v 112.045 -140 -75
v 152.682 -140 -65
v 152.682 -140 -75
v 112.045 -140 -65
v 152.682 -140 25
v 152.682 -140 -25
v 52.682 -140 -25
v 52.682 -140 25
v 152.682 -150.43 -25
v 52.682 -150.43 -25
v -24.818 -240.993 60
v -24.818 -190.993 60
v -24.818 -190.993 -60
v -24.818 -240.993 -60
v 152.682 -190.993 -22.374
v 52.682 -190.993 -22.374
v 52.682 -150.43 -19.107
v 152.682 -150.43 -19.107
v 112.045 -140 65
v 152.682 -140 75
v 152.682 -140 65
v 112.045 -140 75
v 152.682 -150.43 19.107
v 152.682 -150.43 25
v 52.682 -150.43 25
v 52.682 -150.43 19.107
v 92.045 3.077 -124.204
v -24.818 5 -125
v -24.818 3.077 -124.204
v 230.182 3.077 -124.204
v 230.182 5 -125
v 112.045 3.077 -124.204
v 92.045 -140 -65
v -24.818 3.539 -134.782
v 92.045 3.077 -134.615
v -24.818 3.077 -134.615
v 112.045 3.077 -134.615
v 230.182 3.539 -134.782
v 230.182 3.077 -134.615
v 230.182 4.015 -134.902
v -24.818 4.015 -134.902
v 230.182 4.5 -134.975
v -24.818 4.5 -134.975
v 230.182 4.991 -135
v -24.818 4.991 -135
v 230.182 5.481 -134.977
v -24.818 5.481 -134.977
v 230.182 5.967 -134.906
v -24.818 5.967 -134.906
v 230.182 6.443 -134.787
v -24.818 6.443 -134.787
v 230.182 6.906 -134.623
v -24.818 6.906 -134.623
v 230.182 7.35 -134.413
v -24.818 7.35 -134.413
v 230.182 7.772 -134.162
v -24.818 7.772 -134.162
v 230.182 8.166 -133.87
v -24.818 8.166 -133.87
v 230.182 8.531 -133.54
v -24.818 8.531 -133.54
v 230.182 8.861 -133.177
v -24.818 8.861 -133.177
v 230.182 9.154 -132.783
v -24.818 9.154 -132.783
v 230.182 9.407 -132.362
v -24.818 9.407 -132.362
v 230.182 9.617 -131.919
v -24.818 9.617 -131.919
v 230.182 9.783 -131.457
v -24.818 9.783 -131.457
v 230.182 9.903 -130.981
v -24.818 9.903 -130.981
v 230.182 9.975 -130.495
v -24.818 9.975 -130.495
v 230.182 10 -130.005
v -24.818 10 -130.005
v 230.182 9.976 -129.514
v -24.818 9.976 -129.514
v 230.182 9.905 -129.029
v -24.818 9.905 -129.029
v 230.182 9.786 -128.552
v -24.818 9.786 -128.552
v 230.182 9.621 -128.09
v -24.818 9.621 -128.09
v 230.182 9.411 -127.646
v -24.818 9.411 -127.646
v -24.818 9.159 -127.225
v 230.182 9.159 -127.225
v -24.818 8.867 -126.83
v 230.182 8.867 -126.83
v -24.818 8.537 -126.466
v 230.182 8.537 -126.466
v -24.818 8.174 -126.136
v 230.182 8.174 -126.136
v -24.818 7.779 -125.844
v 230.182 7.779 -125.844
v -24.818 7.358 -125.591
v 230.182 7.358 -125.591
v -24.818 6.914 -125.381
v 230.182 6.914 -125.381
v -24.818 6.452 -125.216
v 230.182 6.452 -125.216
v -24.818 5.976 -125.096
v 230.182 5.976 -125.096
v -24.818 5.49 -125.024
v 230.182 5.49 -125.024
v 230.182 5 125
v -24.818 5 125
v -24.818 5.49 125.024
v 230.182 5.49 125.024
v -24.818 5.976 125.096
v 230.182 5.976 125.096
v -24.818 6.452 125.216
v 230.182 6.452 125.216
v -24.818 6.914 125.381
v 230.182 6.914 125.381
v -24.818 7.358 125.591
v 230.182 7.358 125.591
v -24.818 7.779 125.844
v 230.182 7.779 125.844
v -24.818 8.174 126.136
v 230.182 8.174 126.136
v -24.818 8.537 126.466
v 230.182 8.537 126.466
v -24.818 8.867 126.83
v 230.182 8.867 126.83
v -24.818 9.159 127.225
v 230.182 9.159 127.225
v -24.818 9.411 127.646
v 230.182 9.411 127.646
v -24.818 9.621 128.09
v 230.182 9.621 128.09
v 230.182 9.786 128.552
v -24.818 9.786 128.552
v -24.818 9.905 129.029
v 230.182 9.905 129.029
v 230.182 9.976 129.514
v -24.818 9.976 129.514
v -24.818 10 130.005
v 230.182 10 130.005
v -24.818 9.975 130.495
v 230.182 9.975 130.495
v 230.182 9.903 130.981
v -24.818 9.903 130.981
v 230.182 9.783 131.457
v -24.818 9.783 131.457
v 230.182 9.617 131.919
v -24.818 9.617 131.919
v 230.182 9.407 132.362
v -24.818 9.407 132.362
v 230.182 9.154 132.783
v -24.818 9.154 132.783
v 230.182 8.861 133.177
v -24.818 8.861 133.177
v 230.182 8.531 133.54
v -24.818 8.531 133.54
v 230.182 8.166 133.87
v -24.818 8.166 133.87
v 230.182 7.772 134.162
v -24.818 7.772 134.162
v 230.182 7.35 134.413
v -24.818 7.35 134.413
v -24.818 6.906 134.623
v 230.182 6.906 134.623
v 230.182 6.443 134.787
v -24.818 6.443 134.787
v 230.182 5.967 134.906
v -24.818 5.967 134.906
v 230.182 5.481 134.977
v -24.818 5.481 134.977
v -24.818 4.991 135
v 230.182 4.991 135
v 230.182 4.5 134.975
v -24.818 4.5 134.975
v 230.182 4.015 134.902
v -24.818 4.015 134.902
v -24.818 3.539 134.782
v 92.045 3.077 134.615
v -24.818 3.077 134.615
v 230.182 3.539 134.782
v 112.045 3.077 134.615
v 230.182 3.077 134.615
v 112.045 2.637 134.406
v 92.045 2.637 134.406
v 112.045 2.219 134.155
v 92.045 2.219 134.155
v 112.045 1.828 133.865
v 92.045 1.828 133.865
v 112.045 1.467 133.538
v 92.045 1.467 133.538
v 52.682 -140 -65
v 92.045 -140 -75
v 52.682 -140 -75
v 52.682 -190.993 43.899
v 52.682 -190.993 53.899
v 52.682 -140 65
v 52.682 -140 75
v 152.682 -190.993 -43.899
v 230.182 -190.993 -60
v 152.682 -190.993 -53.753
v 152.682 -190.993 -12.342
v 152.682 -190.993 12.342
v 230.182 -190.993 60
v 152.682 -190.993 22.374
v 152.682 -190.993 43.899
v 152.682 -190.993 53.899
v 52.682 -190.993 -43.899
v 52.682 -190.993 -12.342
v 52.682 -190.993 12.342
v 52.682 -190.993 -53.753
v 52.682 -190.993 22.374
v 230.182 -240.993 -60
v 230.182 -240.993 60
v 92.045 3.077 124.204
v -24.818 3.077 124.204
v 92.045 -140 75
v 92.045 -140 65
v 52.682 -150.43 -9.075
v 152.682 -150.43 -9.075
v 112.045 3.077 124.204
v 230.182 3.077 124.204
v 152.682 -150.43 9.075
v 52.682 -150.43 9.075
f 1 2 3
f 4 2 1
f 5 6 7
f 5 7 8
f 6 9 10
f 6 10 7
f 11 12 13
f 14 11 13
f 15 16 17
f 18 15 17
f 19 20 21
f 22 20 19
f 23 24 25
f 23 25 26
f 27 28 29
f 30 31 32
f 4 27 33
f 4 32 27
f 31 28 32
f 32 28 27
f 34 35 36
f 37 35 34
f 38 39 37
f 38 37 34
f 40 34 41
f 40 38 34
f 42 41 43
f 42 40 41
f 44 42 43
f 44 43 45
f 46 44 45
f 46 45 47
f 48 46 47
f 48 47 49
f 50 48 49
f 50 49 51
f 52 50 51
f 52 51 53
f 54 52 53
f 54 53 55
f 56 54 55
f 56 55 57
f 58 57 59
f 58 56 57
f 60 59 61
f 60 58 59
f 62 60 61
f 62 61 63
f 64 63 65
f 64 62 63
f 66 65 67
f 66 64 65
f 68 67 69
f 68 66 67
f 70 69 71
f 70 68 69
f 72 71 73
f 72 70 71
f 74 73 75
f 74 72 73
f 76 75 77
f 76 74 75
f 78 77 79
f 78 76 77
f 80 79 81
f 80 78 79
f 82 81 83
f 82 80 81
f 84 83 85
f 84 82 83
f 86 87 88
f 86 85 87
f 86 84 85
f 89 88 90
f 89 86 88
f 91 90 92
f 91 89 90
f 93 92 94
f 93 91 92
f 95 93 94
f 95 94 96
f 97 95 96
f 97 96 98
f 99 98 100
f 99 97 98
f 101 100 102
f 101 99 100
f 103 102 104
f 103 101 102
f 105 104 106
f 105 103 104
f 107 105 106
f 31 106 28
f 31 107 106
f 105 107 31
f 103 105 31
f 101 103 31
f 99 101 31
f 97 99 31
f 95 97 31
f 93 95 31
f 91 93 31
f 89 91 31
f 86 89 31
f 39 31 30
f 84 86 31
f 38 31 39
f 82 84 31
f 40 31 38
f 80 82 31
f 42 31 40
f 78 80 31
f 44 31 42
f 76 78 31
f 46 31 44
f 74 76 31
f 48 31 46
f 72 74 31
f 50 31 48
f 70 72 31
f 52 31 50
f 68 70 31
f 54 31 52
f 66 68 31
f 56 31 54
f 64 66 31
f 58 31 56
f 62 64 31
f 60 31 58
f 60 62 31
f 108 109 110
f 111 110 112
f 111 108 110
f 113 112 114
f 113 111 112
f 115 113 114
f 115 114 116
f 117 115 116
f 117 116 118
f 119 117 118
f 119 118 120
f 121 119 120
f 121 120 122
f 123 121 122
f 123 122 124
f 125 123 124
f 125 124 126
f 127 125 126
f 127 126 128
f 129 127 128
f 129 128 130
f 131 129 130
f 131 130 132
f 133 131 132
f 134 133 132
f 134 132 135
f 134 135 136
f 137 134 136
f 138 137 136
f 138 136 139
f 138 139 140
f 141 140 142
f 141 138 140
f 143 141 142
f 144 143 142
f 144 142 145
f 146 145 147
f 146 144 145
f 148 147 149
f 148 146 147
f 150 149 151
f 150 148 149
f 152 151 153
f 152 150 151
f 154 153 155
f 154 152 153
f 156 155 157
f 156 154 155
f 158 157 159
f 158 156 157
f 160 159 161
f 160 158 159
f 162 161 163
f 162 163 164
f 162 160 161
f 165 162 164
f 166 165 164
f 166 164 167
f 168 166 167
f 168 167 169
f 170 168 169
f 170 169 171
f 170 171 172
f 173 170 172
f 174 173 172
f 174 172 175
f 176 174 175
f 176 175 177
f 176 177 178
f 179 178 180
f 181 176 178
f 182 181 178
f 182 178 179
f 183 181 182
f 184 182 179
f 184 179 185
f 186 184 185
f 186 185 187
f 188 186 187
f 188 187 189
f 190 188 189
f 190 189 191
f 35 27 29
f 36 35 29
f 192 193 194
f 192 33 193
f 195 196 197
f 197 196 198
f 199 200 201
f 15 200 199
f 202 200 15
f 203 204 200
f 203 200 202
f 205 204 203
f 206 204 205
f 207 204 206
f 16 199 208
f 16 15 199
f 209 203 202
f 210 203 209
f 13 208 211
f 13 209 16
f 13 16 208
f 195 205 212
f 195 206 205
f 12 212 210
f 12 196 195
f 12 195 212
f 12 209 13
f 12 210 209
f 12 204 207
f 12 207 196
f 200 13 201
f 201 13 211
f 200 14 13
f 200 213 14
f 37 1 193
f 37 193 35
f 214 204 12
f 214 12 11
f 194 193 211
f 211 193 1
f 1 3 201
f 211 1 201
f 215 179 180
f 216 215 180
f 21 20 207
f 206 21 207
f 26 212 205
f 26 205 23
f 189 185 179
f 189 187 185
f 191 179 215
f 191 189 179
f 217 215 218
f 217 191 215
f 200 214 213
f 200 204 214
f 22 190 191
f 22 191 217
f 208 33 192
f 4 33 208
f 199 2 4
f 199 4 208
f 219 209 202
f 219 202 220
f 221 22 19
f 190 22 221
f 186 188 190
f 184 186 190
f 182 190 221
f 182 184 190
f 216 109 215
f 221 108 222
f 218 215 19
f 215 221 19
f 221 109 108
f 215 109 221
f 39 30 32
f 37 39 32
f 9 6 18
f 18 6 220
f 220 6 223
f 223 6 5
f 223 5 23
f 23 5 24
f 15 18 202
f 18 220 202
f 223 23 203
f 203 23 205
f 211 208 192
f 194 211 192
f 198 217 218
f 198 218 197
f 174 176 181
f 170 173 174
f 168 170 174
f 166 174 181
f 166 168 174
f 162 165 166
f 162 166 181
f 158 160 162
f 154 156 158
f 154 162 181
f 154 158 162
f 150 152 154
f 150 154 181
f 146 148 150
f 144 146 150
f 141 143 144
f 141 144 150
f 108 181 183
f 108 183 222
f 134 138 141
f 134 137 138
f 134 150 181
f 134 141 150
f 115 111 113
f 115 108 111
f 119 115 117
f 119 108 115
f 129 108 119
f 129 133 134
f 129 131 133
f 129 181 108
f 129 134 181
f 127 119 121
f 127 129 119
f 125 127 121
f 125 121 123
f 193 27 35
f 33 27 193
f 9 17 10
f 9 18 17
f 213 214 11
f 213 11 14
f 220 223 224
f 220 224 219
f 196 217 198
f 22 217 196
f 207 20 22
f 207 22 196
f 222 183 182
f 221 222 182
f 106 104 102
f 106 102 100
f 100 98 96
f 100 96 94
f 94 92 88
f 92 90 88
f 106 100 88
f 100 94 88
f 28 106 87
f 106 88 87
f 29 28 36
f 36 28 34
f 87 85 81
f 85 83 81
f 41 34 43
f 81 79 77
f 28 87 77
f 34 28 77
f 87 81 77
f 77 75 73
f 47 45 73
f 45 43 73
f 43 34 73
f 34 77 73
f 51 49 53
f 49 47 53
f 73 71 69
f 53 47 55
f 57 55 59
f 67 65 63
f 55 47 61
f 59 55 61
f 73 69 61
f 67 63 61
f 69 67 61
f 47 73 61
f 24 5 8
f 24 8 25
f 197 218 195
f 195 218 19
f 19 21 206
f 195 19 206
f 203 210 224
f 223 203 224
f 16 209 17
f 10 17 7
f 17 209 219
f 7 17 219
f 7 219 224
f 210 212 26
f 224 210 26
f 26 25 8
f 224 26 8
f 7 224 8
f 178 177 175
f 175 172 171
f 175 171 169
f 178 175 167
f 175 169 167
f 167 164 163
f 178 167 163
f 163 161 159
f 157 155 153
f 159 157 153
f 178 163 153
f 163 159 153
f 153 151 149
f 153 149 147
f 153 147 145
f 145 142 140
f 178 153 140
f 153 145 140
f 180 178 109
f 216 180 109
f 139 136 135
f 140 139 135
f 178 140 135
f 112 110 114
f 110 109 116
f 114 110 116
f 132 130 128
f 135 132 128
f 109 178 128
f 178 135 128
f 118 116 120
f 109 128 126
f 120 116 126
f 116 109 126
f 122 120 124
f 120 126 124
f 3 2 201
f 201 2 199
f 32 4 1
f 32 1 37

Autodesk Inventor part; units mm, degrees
ref_plane "YZ Plane" through (0, 0, 0) normal (1, 0, 0) x (0, 1, 0)
ref_plane "XZ Plane" through (0, 0, 0) normal (0, 1, 0) x (-1, 0, 0)
ref_plane "XY Plane" through (0, 0, 0) normal (0, 0, 1) x (1, 0, 0)
sketch "Sketch4" plane through (0, 0, 0) normal (0, 1, 0) x (-1, 0, 0)
  line L0 (-102.6818, 131.0909) -> (-102.6818, 58.0909) construction
  line L1 (24.8182, 125) -> (-230.1818, 125)
  line L2 (-230.1818, 125) -> (-230.1818, 135)
  line L3 (-230.1818, 135) -> (24.8182, 135)
  line L4 (24.8182, 135) -> (24.8182, 125)
  line L5 (24.8182, 125) -> (-230.1818, 135) construction
  line L6 (-230.1818, 125) -> (24.8182, 135) construction
  line L7 (0, 0) -> (36.133, 0) construction
  line L8 (24.8182, -125) -> (-230.1818, -125)
  line L9 (-230.1818, -125) -> (-230.1818, -135)
  line L10 (-230.1818, -135) -> (24.8182, -135)
  line L11 (24.8182, -135) -> (24.8182, -125)
  line L12 (24.8182, -125) -> (-230.1818, -135) construction
  line L13 (-230.1818, -125) -> (24.8182, -135) construction
  point P0 (-102.6818, 130)
  dimension "d4" = 10
  dimension "d6" = 250
  dimension "d7" = 255
extrude "Extrusion2" add sketch "Sketch4" along normal blind 10
sketch "Sketch9" plane through (230.1818, 0, -125) normal (1, 0, 0) x (0, 0, -1)
  line L0 (-125, 0) -> (-125, -106.9842) construction
  line L1 (10, 0) -> (10, 10) construction
  line L2 (0, 10) -> (10, 10) construction
  line L3 (10, 0) -> (0, 10) construction
  line L4 (0, 10) -> (10, 10) construction
  line L5 (10, 10) -> (0, 0) construction
  circle A0 centre (5, 5) radius 5
  line L6 (-260, 0) -> (-260, 10) construction
  line L7 (-250, 10) -> (-260, 10) construction
  line L8 (-260, 0) -> (-250, 10) construction
  line L9 (-250, 10) -> (-260, 10) construction
  line L10 (-260, 10) -> (-250, 0) construction
  circle A1 centre (-255, 5) radius 5
extrude "Extrusion3" cut sketch "Sketch9" against normal through all keep common part
sketch "Sketch10" plane through (230.1818, 5, -130) normal (1, 0, 0) x (0, 0, -1)
  circle A0 centre (0, 0) radius 5 construction
  line L0 (0, 5) -> (-260, 5)
  line L1 (-130, -5) -> (-130, 5) construction
  line L2 (-155, -155.4301) -> (-105, -155.4301)
  line L3 (-105, -155.4301) -> (-105, -145)
  line L4 (-105, -145) -> (-155, -145)
  line L5 (-155, -145) -> (-155, -155.4301)
  line L6 (-155, -155.4301) -> (-105, -145) construction
  line L7 (-105, -155.4301) -> (-155, -145) construction
  line L8 (-130, -150.215) -> (-130, -124.8826) construction
  dimension "d13" = 150
  dimension "d34" = 50
extrude "Extrusion4" add sketch "Sketch10" against normal blind 255
sketch "Sketch11" plane through (230.1818, 5, -130) normal (1, 0, 0) x (0, 0, -1)
  circle A0 centre (0, 0) radius 5 projected
  line L0 (-155, -145) -> (-105, -145) projected
  line L1 (-130, 0) -> (-130, -145) construction
  line L2 (-130, -145) -> (-286.0792, -145) construction
  line L3 (-130, -145) -> (0, -145) construction
  circle A1 centre (-60, -145) radius 5
  circle A2 centre (-200, -145) radius 5
  line L4 (-55, -145) -> (4.6154, -1.9231)
  circle A3 centre (-260, 0) radius 5 projected
  line L5 (-190, -245.9934) -> (-70, -245.9934)
  line L6 (-70, -245.9934) -> (-70, -195.9934)
  line L7 (-70, -195.9934) -> (-190, -195.9934)
  line L8 (-190, -195.9934) -> (-190, -245.9934)
  line L9 (-190, -245.9934) -> (-70, -195.9934) construction
  line L10 (-70, -245.9934) -> (-190, -195.9934) construction
  line L11 (-130, -220.9934) -> (-130, -179.9046) construction
  line L12 (-55, -145) -> (-76.2472, -195.9934)
  line L13 (-5, 0) -> (-65, -145)
  line L14 (-65, -145) -> (-86.1007, -195.9934)
  line L15 (-255, 0) -> (-195, -145)
  line L16 (-263.5381, -3.533) -> (-205, -145)
  line L17 (-195, -145) -> (-173.8993, -195.9934)
  line L18 (-205, -145) -> (-183.8993, -195.9934)
  point P0 (-130, -5)
  dimension "d18" = 10
  dimension "d20" = 140
  dimension "d21" = 120
  dimension "d22" = 50
extrude "Extrusion5" add sketch "Sketch11" against normal blind 255 contours A0 L4 A1 L13 | A1 L12 L13 | A1 L12 L7 L14 | L7 L6 L5 L8 | L7 L18 A2 L17 | A2 L18 L15 | A2 L16 A3 L15
sketch "Sketch12" plane through (-24.8182, 5, -130) normal (-1, 0, 0) x (0, 0, 1)
  line L0 (173.8993, -195.9934) -> (86.1007, -195.9934) projected
  line L1 (105, -155.4301) -> (155, -155.4301) projected
  line L2 (86.1007, -195.9934) -> (173.8993, -195.9934) projected
  line L3 (152.374, -195.9934) -> (149.1071, -155.4301)
  line L4 (142.3416, -195.9934) -> (139.0748, -155.4301)
  line L5 (155, -155.4301) -> (105, -155.4301) projected
  line L6 (255, 0) -> (173.8993, -195.9934) projected
  line L7 (86.1007, -195.9934) -> (5, 0) projected
  line L8 (173.8993, -195.9934) -> (105, -155.4301) construction
  line L9 (155, -155.4301) -> (86.1007, -195.9934) construction
  line L10 (130, -170.1484) -> (130, -155.4301) construction
  line L11 (107.626, -195.9934) -> (110.8929, -155.4301)
  line L12 (117.6584, -195.9934) -> (120.9252, -155.4301)
  point P0 (130, -5)
  point P1 (107.626, -195.9934)
  point P2 (117.6584, -195.9934)
  dimension "d25" = 10
extrude "Extrusion6" add sketch "Sketch12" against normal blind 255 contours L0 L4 L1 L3 | L0 L11 L1 L12
sketch "Sketch13" plane through (230.1818, -240.9934, -60) normal (0, 0, -1) x (-1, 0, 0)
  line L0 (0, 50) -> (255, 50) projected
  line L1 (0, 50) -> (0, 244.0703) projected
  line L2 (0, 50) -> (255, 50) projected
  line L3 (255, 244.0703) -> (255, 50) projected
  line L4 (0, 244.0703) -> (255, 244.0703) projected
  line L5 (0, 90.5633) -> (255, 90.5633) projected
  line L6 (0, 100.9934) -> (255, 100.9934) projected
  line L7 (0, 0) -> (255, 0) projected
  line L8 (0, 0) -> (0, 50) projected
  line L9 (255, 50) -> (255, 0) projected
  line L10 (255, 100.9934) -> (0, 244.0703) construction
  line L11 (1.2728, 100.9934) -> (255, 244.0703) construction
  line L12 (138.1364, 100.9934) -> (118.1364, 100.9934)
  line L13 (118.1364, 100.9934) -> (118.1364, 244.0703)
  line L14 (118.1364, 244.0703) -> (138.1364, 244.0703)
  line L15 (138.1364, 244.0703) -> (138.1364, 100.9934)
  line L16 (138.1364, 100.9934) -> (118.1364, 244.0703) construction
  line L17 (118.1364, 100.9934) -> (138.1364, 244.0703) construction
  point P0 (230.1818, 240.9934)
  point P1 (128.1364, 172.5318)
  point P2 (138.1364, 100.9934)
  point P3 (118.1364, 100.9934)
  dimension "d28" = 20
extrude "Extrusion7" cut sketch "Sketch13" along normal mid plane 434.75 contours L1 L4 L13 L6 | L6 L15 L4 L3
sketch "Sketch14" plane through (230.1818, -240.9934, -60) normal (0, 0, -1) x (-1, 0, 0)
  line L0 (0, 50) -> (255, 50) projected
  line L1 (255, 100.9934) -> (255, 50) projected
  line L2 (255, 50) -> (255, 0) projected
  line L3 (255, 100.9934) -> (138.1364, 100.9934) projected
  line L4 (0, 0) -> (255, 0) projected
  line L5 (0, 0) -> (0, 50) projected
  line L6 (0, 90.5633) -> (255, 90.5633) projected
  line L7 (0, 100.9934) -> (118.1364, 100.9934) projected
  line L8 (0, 100.9934) -> (0, 50) projected
  line L9 (118.1364, 100.9934) -> (138.1364, 100.9934)
  line L10 (128.1364, 88.0174) -> (128.1364, 65.5782) construction
  line L11 (255, 90.5633) -> (0, 100.9934) construction
  line L12 (0, 90.5633) -> (255, 100.9934) construction
  line L13 (127.5, 95.7783) -> (127.5, 90.5633) construction
  line L14 (0, 50) -> (255, 50) projected
  line L15 (77.5, 50) -> (177.5, 50)
  line L16 (177.5, 50) -> (177.5, 100.9934)
  line L17 (177.5, 100.9934) -> (77.5, 100.9934)
  line L18 (77.5, 100.9934) -> (77.5, 50)
  line L19 (177.5, 50) -> (77.5, 100.9934) construction
  line L20 (177.5, 100.9934) -> (77.5, 50) construction
  line L21 (127.5, 75.4967) -> (127.5, 84.9841) construction
  point P0 (230.1818, 240.9934)
  point P1 (77.5, 50)
  point P2 (77.5, 100.9934)
  point P3 (177.5, 100.9934)
  dimension "d31" = 100
extrude "Extrusion8" cut sketch "Sketch14" along normal mid plane 434.75 contours L8 L6 L18 L0 | L8 L7 L18 L6 | L16 L6 L1 L0 | L16 L3 L1 L6
properties part number "drone model"
